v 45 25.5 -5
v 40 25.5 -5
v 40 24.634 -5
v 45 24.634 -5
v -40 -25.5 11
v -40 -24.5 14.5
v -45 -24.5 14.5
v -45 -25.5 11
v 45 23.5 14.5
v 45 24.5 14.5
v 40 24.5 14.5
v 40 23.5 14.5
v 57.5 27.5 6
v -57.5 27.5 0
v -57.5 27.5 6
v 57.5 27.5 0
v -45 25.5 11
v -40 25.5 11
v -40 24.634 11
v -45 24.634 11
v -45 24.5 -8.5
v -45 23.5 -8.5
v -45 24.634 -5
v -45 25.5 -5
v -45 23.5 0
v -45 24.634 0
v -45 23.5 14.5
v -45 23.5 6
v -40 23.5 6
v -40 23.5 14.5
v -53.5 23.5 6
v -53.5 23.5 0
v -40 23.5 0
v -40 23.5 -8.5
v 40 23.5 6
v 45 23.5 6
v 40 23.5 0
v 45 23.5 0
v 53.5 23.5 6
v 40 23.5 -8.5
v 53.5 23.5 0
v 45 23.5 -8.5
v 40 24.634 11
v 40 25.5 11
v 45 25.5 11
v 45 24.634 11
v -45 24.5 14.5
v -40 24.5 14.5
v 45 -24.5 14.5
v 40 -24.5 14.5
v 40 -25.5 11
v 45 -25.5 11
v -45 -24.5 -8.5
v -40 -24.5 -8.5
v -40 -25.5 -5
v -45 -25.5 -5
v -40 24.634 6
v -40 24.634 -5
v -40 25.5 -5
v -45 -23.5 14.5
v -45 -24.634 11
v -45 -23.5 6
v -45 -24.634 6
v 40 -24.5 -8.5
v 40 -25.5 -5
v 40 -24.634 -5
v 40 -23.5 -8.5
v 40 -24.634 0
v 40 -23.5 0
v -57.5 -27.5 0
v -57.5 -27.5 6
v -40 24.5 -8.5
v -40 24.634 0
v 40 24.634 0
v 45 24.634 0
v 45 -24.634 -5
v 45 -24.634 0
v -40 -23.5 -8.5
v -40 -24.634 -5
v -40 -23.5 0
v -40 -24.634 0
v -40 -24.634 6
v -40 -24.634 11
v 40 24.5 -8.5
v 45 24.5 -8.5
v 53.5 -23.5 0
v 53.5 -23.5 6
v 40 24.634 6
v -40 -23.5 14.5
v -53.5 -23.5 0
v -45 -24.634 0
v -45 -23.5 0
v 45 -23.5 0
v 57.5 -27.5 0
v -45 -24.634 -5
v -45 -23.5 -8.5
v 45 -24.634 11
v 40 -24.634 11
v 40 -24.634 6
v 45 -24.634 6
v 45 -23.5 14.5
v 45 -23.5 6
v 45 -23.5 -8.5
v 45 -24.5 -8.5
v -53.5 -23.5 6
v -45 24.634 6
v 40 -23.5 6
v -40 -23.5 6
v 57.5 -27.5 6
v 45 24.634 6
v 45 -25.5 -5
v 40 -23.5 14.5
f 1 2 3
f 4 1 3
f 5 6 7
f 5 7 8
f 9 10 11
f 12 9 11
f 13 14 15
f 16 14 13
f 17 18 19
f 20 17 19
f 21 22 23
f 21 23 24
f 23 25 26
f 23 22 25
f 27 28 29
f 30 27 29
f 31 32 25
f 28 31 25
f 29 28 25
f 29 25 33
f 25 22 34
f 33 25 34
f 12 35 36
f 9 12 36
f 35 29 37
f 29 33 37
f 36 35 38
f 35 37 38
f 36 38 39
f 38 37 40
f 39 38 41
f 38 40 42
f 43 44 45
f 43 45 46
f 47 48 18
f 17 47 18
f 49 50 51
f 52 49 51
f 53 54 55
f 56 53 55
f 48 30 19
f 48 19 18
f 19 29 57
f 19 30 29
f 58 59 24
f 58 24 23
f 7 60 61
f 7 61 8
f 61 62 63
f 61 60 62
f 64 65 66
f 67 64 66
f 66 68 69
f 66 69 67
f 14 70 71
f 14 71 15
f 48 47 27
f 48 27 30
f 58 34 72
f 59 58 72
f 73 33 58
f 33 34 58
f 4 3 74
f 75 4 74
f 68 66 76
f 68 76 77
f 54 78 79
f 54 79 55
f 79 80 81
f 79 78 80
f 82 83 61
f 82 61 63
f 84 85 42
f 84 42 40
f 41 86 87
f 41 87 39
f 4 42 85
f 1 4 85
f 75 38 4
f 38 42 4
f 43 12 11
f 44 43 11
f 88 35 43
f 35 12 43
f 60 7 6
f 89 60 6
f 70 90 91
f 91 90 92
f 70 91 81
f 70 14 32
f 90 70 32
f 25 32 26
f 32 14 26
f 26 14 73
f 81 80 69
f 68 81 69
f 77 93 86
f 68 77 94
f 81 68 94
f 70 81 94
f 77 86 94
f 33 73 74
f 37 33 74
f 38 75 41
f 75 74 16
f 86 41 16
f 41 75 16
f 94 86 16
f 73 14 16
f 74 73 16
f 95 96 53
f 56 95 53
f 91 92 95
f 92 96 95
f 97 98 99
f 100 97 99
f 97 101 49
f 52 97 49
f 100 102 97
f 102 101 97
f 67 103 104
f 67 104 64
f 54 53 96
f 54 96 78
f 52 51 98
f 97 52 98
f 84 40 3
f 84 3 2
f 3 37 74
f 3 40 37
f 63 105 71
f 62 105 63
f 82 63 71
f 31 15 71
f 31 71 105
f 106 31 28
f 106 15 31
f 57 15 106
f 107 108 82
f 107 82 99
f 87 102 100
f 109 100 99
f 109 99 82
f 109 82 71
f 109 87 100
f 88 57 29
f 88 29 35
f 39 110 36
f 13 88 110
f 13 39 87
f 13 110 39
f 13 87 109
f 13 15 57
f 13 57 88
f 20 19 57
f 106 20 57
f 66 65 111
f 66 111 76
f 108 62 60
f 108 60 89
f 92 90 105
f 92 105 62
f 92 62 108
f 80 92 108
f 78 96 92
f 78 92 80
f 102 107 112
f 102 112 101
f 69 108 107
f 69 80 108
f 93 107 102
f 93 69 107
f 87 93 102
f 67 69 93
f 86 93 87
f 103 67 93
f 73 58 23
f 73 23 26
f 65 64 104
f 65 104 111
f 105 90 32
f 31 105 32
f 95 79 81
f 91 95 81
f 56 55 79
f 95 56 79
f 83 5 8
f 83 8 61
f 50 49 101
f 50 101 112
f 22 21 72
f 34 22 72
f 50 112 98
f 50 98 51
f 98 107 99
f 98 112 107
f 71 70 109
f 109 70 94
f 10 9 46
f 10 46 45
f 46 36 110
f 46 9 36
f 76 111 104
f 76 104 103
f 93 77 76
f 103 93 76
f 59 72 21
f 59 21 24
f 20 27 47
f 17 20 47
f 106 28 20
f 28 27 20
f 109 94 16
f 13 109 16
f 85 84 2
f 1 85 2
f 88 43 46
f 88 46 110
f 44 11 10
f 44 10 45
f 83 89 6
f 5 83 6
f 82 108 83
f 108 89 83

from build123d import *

# Parameters (mm, degrees)
SKETCH1_W               = 115
SKETCH1_H               = 55
SKETCH1_W_2             = 107
SKETCH1_H_2             = 47
BOSS_EXTRUDE1_DEPTH     = 6
SKETCH2_W               = 5
SKETCH2_H               = 2
BOSS_EXTRUDE2_DEPTH     = 8.5
CUT_EXTRUDE1_DEPTH      = 10
MIRROR2_COPY_1_SKETCH_W = 5
MIRROR2_COPY_1_SKETCH_H = 2
MIRROR2_COPY_1_DEPTH    = 8.5
MIRROR2_COPY_2_DEPTH    = 10
MIRROR3_COPY_1_SKETCH_W = 5
MIRROR3_COPY_1_SKETCH_H = 2
MIRROR3_COPY_1_DEPTH    = 8.5
MIRROR3_COPY_2_DEPTH    = 10
MIRROR3_COPY_3_SKETCH_W = 5
MIRROR3_COPY_3_SKETCH_H = 2
MIRROR3_COPY_3_DEPTH    = 8.5
MIRROR3_COPY_4_DEPTH    = 10
MIRROR3_COPY_5_SKETCH_W = 5
MIRROR3_COPY_5_SKETCH_H = 2
MIRROR3_COPY_5_DEPTH    = 8.5
MIRROR3_COPY_6_DEPTH    = 10


with BuildPart() as part:
    # Sketch1 → Boss-Extrude1 (new body)
    with BuildSketch(Plane.XY):
        Rectangle(SKETCH1_W, SKETCH1_H)
        Rectangle(SKETCH1_W_2, SKETCH1_H_2, mode=Mode.SUBTRACT)
    extrude(amount=BOSS_EXTRUDE1_DEPTH)

    # Sketch2 → Boss-Extrude2 (add)
    with BuildSketch(Plane.XY.offset(6)):
        with Locations((-42.5, 24.5)):
            Rectangle(SKETCH2_W, SKETCH2_H)
    boss_extrude2 = extrude(amount=BOSS_EXTRUDE2_DEPTH)

    # Sketch3 → Cut-Extrude1 (cut)
    with BuildSketch(Plane(origin=(-40, 0, 0), x_dir=(0, 0, -1), z_dir=(1, 0, 0))):
        Polygon((-14.5, 24.5), (-11, 25.5), (-11, 24.633842956), (-6, 24.633842956), (-6, 26.874562864), (-14.5, 26.874562864), align=None)
    cut_extrude1 = extrude(amount=-CUT_EXTRUDE1_DEPTH, mode=Mode.SUBTRACT)

    # Mirror1: Boss-Extrude2, Cut-Extrude1 across plane
    add(boss_extrude2.mirror(Plane.ZX))
    add(cut_extrude1.mirror(Plane.ZX), mode=Mode.SUBTRACT)

    # Mirror2: Boss-Extrude2, Cut-Extrude1 across plane
    add(boss_extrude2.mirror(Plane(origin=(0, 0, 0), x_dir=(0, 0, 1), z_dir=(1, 0, 0))))
    add(cut_extrude1.mirror(Plane(origin=(0, 0, 0), x_dir=(0, 0, 1), z_dir=(1, 0, 0))), mode=Mode.SUBTRACT)

    # Mirror2 copy 1 sketch → Mirror2 copy 1 (add)
    with BuildSketch(Plane(origin=(0, 0, 6), x_dir=(-1, 0, 0), z_dir=(0, 0, 1))):
        with Locations((-42.5, 24.5)):
            Rectangle(MIRROR2_COPY_1_SKETCH_W, MIRROR2_COPY_1_SKETCH_H)
    extrude(amount=MIRROR2_COPY_1_DEPTH)

    # Mirror2 copy 2 sketch → Mirror2 copy 2 (cut)
    with BuildSketch(Plane(origin=(40, 0, 0), x_dir=(0, 0, -1), z_dir=(-1, 0, 0))):
        Polygon((-14.5, 24.5), (-11, 25.5), (-11, 24.633842956), (-6, 24.633842956), (-6, 26.874562864), (-14.5, 26.874562864), align=None)
    extrude(amount=-MIRROR2_COPY_2_DEPTH, mode=Mode.SUBTRACT)

    # Mirror3: Boss-Extrude2, Cut-Extrude1 across plane
    add(boss_extrude2.mirror(Plane.XY.offset(3)))
    add(cut_extrude1.mirror(Plane.XY.offset(3)), mode=Mode.SUBTRACT)

    # Mirror3 copy 1 sketch → Mirror3 copy 1 (add)
    with BuildSketch(Plane(origin=(0, 0, 0), x_dir=(-1, 0, 0), z_dir=(0, 0, -1))):
        with Locations((-42.5, 24.5)):
            Rectangle(MIRROR3_COPY_1_SKETCH_W, MIRROR3_COPY_1_SKETCH_H)
    extrude(amount=MIRROR3_COPY_1_DEPTH)

    # Mirror3 copy 2 sketch → Mirror3 copy 2 (cut)
    with BuildSketch(Plane(origin=(40, 0, 6), x_dir=(0, 0, 1), z_dir=(-1, 0, 0))):
        Polygon((-14.5, 24.5), (-11, 25.5), (-11, 24.633842956), (-6, 24.633842956), (-6, 26.874562864), (-14.5, 26.874562864), align=None)
    extrude(amount=-MIRROR3_COPY_2_DEPTH, mode=Mode.SUBTRACT)

    # Mirror3 copy 3 sketch → Mirror3 copy 3 (add)
    with BuildSketch(Plane(origin=(0, 0, 0), x_dir=(-1, 0, 0), z_dir=(0, 0, -1))):
        with Locations((-42.5, -24.5)):
            Rectangle(MIRROR3_COPY_3_SKETCH_W, MIRROR3_COPY_3_SKETCH_H)
    extrude(amount=MIRROR3_COPY_3_DEPTH)

    # Mirror3 copy 4 sketch → Mirror3 copy 4 (cut)
    with BuildSketch(Plane(origin=(40, 0, 6), x_dir=(0, 0, 1), z_dir=(-1, 0, 0))):
        Polygon((-14.5, -24.5), (-11, -25.5), (-11, -24.633842956), (-6, -24.633842956), (-6, -26.874562864), (-14.5, -26.874562864), align=None)
    extrude(amount=-MIRROR3_COPY_4_DEPTH, mode=Mode.SUBTRACT)

    # Mirror3 copy 5 sketch → Mirror3 copy 5 (add)
    with BuildSketch(Plane(origin=(0, 0, 0), x_dir=(1, 0, 0), z_dir=(0, 0, -1))):
        with Locations((-42.5, 24.5)):
            Rectangle(MIRROR3_COPY_5_SKETCH_W, MIRROR3_COPY_5_SKETCH_H)
    extrude(amount=MIRROR3_COPY_5_DEPTH)

    # Mirror3 copy 6 sketch → Mirror3 copy 6 (cut)
    with BuildSketch(Plane(origin=(-40, 0, 6), x_dir=(0, 0, 1), z_dir=(1, 0, 0))):
        Polygon((-14.5, 24.5), (-11, 25.5), (-11, 24.633842956), (-6, 24.633842956), (-6, 26.874562864), (-14.5, 26.874562864), align=None)
    extrude(amount=-MIRROR3_COPY_6_DEPTH, mode=Mode.SUBTRACT)


solid = part.part
